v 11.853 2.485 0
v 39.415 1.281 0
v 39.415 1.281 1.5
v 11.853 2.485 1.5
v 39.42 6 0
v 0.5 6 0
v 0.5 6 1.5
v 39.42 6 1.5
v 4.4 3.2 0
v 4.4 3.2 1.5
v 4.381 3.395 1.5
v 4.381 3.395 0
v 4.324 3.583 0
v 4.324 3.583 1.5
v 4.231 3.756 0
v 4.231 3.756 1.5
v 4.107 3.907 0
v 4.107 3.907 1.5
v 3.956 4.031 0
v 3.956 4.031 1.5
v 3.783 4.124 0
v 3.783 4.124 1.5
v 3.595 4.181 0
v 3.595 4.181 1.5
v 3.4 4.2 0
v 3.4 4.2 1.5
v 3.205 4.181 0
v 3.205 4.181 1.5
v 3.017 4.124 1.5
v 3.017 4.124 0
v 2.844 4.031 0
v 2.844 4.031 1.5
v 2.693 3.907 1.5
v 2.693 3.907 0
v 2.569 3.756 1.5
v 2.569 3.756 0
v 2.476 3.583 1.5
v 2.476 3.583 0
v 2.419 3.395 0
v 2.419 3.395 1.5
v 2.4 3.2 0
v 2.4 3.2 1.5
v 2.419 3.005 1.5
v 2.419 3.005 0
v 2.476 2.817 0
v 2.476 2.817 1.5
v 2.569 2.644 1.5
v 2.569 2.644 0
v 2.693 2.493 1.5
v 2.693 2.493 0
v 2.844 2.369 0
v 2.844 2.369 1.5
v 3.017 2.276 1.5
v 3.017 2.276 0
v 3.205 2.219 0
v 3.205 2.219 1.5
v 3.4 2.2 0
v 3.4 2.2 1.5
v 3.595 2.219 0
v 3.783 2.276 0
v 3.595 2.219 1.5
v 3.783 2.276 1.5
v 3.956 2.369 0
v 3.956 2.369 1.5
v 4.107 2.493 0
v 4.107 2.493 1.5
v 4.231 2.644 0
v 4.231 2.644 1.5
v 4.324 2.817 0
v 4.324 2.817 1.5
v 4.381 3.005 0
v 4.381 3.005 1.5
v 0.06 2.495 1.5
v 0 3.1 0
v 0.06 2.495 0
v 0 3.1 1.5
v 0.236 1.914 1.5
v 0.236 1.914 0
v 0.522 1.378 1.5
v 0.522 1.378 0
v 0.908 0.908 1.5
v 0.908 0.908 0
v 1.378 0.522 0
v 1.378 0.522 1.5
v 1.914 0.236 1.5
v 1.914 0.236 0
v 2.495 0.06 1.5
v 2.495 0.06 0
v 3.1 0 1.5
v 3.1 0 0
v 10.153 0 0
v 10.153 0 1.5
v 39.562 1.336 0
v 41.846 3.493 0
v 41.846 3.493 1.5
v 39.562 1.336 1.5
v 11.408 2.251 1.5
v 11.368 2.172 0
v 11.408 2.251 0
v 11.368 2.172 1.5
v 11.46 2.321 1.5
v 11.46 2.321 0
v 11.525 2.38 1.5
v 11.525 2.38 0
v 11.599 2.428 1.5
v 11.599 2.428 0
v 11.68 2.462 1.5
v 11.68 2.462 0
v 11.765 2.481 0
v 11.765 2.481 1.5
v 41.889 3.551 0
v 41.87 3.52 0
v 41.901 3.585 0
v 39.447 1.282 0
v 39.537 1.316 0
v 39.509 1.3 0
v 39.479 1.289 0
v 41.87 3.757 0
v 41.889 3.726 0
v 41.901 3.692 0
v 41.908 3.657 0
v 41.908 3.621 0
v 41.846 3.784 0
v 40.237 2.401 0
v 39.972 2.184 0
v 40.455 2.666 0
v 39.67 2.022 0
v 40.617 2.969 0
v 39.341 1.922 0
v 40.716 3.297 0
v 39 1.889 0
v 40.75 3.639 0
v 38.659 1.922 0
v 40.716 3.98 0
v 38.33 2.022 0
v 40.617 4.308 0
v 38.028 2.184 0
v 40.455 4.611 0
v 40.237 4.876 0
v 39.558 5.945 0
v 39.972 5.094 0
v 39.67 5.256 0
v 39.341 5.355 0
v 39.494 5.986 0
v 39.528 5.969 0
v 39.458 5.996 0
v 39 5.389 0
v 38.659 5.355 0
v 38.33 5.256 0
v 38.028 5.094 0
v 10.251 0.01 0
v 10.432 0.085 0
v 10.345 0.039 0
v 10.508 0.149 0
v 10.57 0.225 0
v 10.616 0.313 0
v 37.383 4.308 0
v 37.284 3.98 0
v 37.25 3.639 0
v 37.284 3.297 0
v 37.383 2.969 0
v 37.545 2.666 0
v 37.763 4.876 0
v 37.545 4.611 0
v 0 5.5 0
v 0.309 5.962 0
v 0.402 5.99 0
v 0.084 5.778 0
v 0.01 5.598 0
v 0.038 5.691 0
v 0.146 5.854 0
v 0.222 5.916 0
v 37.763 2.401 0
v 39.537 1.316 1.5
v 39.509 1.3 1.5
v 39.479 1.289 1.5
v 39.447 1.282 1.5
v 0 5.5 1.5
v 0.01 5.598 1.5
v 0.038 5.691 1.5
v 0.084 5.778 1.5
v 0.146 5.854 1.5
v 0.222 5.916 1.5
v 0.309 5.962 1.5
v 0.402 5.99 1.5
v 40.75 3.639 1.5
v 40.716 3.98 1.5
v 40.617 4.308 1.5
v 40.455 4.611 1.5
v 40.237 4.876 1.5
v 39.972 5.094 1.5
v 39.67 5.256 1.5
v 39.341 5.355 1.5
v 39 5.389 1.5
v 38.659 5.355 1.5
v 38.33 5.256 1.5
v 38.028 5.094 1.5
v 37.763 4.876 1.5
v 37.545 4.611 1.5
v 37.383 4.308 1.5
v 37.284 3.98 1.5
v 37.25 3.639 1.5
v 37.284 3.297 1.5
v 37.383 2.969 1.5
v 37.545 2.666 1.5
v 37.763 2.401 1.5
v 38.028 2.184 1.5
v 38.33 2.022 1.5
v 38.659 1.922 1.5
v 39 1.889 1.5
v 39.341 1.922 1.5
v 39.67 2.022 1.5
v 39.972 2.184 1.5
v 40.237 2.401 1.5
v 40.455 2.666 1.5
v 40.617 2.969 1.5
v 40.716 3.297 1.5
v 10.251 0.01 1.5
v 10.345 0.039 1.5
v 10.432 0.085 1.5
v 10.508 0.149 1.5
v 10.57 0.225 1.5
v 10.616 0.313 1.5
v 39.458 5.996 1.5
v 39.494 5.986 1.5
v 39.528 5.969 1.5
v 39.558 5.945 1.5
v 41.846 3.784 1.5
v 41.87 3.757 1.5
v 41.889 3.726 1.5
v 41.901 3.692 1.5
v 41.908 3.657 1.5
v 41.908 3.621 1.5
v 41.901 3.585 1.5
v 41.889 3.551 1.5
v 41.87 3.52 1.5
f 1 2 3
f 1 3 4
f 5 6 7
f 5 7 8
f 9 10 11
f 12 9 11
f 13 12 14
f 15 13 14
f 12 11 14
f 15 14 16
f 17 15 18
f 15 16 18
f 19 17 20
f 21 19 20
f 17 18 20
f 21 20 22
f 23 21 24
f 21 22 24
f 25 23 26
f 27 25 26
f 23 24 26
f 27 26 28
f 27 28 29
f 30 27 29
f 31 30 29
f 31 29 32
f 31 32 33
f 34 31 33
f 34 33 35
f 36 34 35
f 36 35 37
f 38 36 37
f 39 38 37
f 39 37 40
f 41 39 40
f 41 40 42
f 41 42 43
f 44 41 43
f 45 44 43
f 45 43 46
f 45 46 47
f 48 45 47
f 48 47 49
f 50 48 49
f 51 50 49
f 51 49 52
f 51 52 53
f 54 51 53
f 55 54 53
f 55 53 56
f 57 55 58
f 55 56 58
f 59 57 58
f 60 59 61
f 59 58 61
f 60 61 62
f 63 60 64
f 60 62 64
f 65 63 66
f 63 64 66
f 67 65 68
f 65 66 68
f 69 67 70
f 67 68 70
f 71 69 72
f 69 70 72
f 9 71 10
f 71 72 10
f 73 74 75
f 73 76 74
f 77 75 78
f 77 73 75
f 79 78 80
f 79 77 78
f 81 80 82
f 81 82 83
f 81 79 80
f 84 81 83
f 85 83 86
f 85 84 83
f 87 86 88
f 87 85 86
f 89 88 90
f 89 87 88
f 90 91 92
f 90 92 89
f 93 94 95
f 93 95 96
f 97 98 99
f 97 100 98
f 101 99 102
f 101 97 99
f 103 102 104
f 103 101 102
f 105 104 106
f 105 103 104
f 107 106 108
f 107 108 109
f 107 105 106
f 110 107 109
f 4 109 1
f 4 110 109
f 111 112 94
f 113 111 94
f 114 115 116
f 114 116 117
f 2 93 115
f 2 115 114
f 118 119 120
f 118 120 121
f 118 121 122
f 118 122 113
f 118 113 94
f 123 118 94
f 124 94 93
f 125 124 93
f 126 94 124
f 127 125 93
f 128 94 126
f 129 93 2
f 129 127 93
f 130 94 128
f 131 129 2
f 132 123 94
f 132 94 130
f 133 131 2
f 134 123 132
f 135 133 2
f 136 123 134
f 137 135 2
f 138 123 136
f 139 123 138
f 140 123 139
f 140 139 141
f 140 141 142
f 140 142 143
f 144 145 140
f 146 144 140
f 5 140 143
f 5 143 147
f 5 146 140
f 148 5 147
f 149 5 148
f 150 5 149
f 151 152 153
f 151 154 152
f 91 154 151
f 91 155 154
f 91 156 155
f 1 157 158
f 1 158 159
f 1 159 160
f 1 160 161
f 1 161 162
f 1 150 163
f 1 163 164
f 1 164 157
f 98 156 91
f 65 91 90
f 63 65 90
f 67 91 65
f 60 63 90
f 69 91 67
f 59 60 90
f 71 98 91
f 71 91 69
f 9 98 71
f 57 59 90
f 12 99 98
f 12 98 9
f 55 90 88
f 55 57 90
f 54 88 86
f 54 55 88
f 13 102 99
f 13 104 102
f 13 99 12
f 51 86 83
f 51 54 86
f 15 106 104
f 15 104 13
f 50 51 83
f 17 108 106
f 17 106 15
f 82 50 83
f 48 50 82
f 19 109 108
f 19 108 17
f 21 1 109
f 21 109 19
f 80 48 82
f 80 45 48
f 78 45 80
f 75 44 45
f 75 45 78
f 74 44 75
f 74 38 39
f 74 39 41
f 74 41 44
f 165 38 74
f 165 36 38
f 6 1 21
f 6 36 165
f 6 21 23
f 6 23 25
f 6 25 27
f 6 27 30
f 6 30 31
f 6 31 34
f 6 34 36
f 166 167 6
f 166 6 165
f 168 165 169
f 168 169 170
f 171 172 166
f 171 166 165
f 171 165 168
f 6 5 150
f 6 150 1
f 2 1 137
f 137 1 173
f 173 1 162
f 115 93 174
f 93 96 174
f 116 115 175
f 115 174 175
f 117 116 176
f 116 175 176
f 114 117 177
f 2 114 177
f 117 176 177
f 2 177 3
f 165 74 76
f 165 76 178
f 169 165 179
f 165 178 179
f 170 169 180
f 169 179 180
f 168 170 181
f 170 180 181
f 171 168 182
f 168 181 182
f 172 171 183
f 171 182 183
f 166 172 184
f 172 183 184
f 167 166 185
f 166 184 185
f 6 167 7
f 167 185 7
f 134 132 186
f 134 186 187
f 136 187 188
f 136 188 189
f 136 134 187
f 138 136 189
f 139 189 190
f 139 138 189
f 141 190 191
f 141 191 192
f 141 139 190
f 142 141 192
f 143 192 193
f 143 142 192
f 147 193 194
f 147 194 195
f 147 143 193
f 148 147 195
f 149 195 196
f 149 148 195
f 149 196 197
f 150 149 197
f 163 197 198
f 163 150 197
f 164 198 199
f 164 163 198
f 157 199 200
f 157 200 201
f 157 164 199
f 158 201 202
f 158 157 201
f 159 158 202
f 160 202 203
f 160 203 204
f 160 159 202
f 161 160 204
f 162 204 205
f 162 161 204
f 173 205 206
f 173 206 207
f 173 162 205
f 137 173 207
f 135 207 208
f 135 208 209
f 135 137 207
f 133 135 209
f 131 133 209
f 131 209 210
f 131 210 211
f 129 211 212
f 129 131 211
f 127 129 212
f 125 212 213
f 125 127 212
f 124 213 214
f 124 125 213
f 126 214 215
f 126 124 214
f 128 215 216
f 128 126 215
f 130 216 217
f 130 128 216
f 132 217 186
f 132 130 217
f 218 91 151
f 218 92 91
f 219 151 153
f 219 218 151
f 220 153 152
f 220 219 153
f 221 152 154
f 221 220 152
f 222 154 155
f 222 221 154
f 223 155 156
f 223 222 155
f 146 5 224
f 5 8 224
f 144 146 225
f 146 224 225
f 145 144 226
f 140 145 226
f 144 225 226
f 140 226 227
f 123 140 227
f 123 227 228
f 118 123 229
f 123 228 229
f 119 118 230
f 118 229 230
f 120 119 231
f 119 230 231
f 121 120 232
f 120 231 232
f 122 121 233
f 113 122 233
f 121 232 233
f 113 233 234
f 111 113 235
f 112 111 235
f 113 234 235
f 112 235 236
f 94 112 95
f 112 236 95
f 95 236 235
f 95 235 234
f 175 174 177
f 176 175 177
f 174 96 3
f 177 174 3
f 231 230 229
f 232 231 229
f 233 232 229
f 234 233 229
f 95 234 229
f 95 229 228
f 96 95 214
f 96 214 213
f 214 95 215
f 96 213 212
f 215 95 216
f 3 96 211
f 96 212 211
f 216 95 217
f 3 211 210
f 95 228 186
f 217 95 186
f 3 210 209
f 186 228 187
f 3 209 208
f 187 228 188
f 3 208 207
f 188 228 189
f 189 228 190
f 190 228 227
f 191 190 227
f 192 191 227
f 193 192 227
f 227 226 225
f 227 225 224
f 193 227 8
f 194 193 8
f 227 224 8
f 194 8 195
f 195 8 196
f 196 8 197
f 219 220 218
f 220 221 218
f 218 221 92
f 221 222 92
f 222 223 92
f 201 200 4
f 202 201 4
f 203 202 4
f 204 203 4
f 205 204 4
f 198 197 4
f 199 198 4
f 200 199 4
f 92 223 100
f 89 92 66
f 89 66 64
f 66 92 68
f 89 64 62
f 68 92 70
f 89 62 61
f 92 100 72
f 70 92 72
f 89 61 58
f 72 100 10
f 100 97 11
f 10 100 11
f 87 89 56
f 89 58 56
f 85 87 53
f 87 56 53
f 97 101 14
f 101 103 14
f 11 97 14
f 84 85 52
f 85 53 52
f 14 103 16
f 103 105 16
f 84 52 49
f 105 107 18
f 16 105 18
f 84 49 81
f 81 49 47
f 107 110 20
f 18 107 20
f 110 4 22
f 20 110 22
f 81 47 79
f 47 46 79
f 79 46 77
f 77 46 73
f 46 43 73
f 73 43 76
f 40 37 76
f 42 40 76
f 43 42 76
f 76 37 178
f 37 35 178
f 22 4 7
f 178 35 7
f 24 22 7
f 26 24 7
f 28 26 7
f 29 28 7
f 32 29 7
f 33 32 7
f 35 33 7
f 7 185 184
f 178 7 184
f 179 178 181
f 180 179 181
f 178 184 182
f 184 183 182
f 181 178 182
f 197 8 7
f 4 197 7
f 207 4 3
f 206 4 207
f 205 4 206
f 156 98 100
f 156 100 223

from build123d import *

# Parameters (mm, degrees)
SKETCH1_R           = 1.75
BOSS_EXTRUDE1_DEPTH = 1.5
FILLET1_R           = 0.5
FILLET2_R           = 0.2
SKETCH5_R           = 1
CUT_EXTRUDE3_DEPTH  = 2.5
FILLET3_R           = 3.1


with BuildPart() as part:
    # Sketch1 → Boss-Extrude1 (new body)
    with BuildSketch(Plane.XY):
        Polygon((0, 0), (0, 6), (39.5, 6), (42, 3.638746799), (39.5, 1.277493599), (11.5, 2.5), (10.489934435, 0), align=None)
        with Locations((39, 3.638746799)):
            Circle(SKETCH1_R, mode=Mode.SUBTRACT)
    extrude(amount=BOSS_EXTRUDE1_DEPTH)

    # Fillet1
    fillet1_edges = [part.edges().sort_by_distance(p)[0] for p in [
        (0, 6, 0.75),
        (11.5, 2.5, 0.75),
        (10.489934435, 0, 0.75),
    ]]
    fillet(fillet1_edges, radius=FILLET1_R)

    # Fillet2
    fillet2_edges = [part.edges().sort_by_distance(p)[0] for p in [
        (39.5, 6, 0.75),
        (42, 3.638746799, 0.75),
        (39.5, 1.277493599, 0.75),
    ]]
    fillet(fillet2_edges, radius=FILLET2_R)

    # Sketch5 → Cut-Extrude3 (cut, through all)
    with BuildSketch(Plane.XY.offset(1.5)):
        with Locations((3.4, 3.2)):
            Circle(SKETCH5_R)
    extrude(amount=-CUT_EXTRUDE3_DEPTH, mode=Mode.SUBTRACT)

    # Fillet3
    fillet3_edges = [part.edges().sort_by_distance(p)[0] for p in [
        (0, 0, 0.75),
    ]]
    fillet(fillet3_edges, radius=FILLET3_R)


solid = part.part
